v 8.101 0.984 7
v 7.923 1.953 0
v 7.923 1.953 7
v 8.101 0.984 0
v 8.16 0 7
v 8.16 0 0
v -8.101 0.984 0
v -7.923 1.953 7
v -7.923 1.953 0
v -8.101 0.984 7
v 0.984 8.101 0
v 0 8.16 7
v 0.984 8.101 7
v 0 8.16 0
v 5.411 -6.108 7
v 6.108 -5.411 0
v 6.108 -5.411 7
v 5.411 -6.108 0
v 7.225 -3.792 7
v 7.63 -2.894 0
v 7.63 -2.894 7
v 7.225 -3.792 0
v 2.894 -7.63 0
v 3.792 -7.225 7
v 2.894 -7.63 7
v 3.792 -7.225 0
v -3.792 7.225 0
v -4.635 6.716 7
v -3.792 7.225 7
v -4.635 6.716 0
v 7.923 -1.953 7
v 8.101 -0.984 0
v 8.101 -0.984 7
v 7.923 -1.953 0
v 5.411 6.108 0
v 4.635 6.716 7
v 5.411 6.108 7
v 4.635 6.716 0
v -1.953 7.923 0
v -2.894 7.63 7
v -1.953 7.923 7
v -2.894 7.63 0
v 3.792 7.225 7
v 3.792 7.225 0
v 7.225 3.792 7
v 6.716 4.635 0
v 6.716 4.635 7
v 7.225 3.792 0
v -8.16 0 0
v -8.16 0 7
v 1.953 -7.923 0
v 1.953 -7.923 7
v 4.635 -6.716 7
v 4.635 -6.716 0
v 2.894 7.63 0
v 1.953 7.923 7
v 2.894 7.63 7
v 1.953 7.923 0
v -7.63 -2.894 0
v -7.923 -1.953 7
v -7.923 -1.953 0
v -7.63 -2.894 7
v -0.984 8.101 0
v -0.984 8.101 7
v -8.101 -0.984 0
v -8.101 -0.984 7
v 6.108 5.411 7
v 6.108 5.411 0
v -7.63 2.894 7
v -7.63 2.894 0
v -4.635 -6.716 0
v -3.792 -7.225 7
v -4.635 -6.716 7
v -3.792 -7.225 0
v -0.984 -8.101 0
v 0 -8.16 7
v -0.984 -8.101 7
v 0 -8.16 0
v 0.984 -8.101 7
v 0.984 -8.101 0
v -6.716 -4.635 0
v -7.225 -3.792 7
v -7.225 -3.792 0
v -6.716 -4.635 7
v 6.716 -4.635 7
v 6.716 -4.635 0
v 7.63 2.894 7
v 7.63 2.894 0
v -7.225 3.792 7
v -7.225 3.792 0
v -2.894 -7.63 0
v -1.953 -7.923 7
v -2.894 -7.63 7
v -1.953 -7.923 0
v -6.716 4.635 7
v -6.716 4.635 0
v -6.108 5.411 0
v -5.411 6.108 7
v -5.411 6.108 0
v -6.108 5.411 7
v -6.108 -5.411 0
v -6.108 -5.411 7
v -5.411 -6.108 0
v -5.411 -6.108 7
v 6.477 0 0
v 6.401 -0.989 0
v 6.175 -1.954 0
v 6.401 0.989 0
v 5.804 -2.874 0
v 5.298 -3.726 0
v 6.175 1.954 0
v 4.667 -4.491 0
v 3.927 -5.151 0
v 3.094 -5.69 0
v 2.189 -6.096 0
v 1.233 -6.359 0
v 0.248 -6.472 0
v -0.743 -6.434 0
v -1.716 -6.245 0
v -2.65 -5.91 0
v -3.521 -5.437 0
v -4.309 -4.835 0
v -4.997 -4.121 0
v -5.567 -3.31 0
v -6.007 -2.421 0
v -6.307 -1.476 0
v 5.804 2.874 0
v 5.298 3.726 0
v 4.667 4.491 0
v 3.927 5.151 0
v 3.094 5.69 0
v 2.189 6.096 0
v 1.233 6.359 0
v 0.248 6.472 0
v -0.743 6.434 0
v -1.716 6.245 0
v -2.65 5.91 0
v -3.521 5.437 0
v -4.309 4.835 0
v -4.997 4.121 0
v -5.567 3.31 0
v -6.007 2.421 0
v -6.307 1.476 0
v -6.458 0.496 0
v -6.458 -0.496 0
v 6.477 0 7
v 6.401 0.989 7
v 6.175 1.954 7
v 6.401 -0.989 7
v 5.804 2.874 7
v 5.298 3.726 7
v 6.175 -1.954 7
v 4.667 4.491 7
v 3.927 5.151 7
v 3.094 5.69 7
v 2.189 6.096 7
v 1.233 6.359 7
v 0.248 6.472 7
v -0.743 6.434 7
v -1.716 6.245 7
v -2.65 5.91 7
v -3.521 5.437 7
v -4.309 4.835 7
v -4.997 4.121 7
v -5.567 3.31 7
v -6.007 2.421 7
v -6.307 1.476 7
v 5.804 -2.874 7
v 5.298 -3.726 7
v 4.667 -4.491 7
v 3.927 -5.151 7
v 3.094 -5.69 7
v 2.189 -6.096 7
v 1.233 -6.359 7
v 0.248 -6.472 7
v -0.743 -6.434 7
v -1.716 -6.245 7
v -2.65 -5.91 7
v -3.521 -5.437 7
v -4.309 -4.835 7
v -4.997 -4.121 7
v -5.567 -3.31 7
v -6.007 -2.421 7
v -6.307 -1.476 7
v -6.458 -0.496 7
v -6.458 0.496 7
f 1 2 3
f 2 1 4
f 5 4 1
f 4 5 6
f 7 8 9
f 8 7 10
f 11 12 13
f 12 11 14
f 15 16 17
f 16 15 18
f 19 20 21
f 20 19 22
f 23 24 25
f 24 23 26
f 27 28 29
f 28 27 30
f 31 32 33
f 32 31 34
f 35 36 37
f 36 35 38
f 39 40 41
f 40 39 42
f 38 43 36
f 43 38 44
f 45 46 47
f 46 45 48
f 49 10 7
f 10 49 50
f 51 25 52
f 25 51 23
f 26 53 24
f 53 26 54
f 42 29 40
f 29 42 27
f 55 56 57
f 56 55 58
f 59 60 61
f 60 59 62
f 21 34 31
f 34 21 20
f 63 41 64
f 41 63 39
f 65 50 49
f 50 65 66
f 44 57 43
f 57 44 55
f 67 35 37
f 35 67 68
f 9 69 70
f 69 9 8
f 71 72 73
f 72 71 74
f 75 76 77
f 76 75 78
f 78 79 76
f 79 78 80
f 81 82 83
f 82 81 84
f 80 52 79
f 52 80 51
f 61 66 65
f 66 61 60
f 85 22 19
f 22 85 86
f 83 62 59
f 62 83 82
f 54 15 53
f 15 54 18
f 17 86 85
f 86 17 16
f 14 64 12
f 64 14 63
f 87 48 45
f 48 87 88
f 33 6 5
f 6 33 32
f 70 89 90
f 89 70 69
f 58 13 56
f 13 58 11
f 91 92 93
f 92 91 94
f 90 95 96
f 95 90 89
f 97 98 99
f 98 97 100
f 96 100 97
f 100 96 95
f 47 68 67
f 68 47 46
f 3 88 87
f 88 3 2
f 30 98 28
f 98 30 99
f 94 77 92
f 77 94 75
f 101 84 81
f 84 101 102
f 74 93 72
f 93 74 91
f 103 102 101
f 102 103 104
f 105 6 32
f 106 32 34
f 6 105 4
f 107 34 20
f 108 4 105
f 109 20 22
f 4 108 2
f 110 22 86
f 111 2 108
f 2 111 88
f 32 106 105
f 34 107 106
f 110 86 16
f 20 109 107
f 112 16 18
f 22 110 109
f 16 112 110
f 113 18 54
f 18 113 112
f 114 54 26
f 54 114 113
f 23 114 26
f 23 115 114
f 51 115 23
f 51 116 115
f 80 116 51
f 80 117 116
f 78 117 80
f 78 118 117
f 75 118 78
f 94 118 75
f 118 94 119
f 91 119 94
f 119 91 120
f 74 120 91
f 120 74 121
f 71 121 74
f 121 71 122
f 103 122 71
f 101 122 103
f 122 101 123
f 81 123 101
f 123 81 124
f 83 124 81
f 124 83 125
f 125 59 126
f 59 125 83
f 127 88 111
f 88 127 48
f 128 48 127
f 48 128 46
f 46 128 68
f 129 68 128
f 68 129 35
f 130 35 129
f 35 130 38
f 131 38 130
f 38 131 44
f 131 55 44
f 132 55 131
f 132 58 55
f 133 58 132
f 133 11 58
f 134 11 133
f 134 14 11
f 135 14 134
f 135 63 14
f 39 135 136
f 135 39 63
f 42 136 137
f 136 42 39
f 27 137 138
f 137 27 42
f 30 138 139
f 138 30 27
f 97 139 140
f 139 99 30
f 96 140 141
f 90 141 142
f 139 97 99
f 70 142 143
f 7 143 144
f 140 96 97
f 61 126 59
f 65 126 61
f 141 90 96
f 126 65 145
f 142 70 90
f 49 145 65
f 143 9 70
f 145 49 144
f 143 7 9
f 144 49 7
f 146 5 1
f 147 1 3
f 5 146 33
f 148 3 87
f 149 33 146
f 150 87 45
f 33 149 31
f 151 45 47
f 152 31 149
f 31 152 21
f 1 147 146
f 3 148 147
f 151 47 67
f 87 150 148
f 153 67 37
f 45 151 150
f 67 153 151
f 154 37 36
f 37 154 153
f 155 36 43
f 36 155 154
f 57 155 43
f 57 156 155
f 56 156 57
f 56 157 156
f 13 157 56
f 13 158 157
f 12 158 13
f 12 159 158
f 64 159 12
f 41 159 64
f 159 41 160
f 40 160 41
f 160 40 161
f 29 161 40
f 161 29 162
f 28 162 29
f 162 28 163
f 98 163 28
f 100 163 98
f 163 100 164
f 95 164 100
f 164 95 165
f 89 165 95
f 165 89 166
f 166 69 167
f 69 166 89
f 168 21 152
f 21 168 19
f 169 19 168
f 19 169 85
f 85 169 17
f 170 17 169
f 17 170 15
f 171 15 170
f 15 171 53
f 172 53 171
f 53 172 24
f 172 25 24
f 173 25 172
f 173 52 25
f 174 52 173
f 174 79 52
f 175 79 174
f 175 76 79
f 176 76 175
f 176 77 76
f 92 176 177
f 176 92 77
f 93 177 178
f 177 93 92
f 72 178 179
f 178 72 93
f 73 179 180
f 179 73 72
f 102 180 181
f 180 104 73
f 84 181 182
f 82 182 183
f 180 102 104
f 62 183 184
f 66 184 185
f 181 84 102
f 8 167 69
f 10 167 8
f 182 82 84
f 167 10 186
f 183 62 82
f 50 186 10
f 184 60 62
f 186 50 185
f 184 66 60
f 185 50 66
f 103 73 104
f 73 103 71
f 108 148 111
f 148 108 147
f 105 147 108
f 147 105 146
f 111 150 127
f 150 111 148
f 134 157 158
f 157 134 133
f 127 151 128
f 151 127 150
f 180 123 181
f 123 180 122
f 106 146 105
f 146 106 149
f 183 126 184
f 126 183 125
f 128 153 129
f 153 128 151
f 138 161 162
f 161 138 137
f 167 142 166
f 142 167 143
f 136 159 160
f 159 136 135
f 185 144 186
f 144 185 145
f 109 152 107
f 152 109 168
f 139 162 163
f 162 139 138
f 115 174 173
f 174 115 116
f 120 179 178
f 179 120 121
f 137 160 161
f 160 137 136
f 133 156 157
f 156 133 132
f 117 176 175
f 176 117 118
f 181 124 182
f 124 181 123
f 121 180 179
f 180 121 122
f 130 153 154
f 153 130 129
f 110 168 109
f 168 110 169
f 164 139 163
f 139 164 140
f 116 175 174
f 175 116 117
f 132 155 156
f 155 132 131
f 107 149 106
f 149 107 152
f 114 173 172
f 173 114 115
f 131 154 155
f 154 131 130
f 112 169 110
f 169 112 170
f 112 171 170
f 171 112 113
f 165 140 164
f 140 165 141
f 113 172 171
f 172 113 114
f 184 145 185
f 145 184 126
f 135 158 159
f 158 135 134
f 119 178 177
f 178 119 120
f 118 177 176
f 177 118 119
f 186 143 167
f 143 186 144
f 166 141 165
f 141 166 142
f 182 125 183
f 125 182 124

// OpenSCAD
/*
 * Creates a small sleeve to be used with 1/4" bolt through 8mm bearing
 */

FudgeFactor = 2; // Percentage to increase size of holes/cylinders to compensate for OpenSCAD polygon approximation

Inch = 25.4;  // Number of mm in an inch
InnerDiameter = 1/4*Inch;
OuterDiameter = 8;
Height = 7;

$fa = 1;
$fs = 1;

InnerRadius = InnerDiameter * (1 + FudgeFactor/100);
OuterRadius = OuterDiameter * (1 + FudgeFactor/100);

difference(){
  cylinder(r=OuterRadius, h=Height);
  cylinder(r=InnerRadius, h=Height);
}
